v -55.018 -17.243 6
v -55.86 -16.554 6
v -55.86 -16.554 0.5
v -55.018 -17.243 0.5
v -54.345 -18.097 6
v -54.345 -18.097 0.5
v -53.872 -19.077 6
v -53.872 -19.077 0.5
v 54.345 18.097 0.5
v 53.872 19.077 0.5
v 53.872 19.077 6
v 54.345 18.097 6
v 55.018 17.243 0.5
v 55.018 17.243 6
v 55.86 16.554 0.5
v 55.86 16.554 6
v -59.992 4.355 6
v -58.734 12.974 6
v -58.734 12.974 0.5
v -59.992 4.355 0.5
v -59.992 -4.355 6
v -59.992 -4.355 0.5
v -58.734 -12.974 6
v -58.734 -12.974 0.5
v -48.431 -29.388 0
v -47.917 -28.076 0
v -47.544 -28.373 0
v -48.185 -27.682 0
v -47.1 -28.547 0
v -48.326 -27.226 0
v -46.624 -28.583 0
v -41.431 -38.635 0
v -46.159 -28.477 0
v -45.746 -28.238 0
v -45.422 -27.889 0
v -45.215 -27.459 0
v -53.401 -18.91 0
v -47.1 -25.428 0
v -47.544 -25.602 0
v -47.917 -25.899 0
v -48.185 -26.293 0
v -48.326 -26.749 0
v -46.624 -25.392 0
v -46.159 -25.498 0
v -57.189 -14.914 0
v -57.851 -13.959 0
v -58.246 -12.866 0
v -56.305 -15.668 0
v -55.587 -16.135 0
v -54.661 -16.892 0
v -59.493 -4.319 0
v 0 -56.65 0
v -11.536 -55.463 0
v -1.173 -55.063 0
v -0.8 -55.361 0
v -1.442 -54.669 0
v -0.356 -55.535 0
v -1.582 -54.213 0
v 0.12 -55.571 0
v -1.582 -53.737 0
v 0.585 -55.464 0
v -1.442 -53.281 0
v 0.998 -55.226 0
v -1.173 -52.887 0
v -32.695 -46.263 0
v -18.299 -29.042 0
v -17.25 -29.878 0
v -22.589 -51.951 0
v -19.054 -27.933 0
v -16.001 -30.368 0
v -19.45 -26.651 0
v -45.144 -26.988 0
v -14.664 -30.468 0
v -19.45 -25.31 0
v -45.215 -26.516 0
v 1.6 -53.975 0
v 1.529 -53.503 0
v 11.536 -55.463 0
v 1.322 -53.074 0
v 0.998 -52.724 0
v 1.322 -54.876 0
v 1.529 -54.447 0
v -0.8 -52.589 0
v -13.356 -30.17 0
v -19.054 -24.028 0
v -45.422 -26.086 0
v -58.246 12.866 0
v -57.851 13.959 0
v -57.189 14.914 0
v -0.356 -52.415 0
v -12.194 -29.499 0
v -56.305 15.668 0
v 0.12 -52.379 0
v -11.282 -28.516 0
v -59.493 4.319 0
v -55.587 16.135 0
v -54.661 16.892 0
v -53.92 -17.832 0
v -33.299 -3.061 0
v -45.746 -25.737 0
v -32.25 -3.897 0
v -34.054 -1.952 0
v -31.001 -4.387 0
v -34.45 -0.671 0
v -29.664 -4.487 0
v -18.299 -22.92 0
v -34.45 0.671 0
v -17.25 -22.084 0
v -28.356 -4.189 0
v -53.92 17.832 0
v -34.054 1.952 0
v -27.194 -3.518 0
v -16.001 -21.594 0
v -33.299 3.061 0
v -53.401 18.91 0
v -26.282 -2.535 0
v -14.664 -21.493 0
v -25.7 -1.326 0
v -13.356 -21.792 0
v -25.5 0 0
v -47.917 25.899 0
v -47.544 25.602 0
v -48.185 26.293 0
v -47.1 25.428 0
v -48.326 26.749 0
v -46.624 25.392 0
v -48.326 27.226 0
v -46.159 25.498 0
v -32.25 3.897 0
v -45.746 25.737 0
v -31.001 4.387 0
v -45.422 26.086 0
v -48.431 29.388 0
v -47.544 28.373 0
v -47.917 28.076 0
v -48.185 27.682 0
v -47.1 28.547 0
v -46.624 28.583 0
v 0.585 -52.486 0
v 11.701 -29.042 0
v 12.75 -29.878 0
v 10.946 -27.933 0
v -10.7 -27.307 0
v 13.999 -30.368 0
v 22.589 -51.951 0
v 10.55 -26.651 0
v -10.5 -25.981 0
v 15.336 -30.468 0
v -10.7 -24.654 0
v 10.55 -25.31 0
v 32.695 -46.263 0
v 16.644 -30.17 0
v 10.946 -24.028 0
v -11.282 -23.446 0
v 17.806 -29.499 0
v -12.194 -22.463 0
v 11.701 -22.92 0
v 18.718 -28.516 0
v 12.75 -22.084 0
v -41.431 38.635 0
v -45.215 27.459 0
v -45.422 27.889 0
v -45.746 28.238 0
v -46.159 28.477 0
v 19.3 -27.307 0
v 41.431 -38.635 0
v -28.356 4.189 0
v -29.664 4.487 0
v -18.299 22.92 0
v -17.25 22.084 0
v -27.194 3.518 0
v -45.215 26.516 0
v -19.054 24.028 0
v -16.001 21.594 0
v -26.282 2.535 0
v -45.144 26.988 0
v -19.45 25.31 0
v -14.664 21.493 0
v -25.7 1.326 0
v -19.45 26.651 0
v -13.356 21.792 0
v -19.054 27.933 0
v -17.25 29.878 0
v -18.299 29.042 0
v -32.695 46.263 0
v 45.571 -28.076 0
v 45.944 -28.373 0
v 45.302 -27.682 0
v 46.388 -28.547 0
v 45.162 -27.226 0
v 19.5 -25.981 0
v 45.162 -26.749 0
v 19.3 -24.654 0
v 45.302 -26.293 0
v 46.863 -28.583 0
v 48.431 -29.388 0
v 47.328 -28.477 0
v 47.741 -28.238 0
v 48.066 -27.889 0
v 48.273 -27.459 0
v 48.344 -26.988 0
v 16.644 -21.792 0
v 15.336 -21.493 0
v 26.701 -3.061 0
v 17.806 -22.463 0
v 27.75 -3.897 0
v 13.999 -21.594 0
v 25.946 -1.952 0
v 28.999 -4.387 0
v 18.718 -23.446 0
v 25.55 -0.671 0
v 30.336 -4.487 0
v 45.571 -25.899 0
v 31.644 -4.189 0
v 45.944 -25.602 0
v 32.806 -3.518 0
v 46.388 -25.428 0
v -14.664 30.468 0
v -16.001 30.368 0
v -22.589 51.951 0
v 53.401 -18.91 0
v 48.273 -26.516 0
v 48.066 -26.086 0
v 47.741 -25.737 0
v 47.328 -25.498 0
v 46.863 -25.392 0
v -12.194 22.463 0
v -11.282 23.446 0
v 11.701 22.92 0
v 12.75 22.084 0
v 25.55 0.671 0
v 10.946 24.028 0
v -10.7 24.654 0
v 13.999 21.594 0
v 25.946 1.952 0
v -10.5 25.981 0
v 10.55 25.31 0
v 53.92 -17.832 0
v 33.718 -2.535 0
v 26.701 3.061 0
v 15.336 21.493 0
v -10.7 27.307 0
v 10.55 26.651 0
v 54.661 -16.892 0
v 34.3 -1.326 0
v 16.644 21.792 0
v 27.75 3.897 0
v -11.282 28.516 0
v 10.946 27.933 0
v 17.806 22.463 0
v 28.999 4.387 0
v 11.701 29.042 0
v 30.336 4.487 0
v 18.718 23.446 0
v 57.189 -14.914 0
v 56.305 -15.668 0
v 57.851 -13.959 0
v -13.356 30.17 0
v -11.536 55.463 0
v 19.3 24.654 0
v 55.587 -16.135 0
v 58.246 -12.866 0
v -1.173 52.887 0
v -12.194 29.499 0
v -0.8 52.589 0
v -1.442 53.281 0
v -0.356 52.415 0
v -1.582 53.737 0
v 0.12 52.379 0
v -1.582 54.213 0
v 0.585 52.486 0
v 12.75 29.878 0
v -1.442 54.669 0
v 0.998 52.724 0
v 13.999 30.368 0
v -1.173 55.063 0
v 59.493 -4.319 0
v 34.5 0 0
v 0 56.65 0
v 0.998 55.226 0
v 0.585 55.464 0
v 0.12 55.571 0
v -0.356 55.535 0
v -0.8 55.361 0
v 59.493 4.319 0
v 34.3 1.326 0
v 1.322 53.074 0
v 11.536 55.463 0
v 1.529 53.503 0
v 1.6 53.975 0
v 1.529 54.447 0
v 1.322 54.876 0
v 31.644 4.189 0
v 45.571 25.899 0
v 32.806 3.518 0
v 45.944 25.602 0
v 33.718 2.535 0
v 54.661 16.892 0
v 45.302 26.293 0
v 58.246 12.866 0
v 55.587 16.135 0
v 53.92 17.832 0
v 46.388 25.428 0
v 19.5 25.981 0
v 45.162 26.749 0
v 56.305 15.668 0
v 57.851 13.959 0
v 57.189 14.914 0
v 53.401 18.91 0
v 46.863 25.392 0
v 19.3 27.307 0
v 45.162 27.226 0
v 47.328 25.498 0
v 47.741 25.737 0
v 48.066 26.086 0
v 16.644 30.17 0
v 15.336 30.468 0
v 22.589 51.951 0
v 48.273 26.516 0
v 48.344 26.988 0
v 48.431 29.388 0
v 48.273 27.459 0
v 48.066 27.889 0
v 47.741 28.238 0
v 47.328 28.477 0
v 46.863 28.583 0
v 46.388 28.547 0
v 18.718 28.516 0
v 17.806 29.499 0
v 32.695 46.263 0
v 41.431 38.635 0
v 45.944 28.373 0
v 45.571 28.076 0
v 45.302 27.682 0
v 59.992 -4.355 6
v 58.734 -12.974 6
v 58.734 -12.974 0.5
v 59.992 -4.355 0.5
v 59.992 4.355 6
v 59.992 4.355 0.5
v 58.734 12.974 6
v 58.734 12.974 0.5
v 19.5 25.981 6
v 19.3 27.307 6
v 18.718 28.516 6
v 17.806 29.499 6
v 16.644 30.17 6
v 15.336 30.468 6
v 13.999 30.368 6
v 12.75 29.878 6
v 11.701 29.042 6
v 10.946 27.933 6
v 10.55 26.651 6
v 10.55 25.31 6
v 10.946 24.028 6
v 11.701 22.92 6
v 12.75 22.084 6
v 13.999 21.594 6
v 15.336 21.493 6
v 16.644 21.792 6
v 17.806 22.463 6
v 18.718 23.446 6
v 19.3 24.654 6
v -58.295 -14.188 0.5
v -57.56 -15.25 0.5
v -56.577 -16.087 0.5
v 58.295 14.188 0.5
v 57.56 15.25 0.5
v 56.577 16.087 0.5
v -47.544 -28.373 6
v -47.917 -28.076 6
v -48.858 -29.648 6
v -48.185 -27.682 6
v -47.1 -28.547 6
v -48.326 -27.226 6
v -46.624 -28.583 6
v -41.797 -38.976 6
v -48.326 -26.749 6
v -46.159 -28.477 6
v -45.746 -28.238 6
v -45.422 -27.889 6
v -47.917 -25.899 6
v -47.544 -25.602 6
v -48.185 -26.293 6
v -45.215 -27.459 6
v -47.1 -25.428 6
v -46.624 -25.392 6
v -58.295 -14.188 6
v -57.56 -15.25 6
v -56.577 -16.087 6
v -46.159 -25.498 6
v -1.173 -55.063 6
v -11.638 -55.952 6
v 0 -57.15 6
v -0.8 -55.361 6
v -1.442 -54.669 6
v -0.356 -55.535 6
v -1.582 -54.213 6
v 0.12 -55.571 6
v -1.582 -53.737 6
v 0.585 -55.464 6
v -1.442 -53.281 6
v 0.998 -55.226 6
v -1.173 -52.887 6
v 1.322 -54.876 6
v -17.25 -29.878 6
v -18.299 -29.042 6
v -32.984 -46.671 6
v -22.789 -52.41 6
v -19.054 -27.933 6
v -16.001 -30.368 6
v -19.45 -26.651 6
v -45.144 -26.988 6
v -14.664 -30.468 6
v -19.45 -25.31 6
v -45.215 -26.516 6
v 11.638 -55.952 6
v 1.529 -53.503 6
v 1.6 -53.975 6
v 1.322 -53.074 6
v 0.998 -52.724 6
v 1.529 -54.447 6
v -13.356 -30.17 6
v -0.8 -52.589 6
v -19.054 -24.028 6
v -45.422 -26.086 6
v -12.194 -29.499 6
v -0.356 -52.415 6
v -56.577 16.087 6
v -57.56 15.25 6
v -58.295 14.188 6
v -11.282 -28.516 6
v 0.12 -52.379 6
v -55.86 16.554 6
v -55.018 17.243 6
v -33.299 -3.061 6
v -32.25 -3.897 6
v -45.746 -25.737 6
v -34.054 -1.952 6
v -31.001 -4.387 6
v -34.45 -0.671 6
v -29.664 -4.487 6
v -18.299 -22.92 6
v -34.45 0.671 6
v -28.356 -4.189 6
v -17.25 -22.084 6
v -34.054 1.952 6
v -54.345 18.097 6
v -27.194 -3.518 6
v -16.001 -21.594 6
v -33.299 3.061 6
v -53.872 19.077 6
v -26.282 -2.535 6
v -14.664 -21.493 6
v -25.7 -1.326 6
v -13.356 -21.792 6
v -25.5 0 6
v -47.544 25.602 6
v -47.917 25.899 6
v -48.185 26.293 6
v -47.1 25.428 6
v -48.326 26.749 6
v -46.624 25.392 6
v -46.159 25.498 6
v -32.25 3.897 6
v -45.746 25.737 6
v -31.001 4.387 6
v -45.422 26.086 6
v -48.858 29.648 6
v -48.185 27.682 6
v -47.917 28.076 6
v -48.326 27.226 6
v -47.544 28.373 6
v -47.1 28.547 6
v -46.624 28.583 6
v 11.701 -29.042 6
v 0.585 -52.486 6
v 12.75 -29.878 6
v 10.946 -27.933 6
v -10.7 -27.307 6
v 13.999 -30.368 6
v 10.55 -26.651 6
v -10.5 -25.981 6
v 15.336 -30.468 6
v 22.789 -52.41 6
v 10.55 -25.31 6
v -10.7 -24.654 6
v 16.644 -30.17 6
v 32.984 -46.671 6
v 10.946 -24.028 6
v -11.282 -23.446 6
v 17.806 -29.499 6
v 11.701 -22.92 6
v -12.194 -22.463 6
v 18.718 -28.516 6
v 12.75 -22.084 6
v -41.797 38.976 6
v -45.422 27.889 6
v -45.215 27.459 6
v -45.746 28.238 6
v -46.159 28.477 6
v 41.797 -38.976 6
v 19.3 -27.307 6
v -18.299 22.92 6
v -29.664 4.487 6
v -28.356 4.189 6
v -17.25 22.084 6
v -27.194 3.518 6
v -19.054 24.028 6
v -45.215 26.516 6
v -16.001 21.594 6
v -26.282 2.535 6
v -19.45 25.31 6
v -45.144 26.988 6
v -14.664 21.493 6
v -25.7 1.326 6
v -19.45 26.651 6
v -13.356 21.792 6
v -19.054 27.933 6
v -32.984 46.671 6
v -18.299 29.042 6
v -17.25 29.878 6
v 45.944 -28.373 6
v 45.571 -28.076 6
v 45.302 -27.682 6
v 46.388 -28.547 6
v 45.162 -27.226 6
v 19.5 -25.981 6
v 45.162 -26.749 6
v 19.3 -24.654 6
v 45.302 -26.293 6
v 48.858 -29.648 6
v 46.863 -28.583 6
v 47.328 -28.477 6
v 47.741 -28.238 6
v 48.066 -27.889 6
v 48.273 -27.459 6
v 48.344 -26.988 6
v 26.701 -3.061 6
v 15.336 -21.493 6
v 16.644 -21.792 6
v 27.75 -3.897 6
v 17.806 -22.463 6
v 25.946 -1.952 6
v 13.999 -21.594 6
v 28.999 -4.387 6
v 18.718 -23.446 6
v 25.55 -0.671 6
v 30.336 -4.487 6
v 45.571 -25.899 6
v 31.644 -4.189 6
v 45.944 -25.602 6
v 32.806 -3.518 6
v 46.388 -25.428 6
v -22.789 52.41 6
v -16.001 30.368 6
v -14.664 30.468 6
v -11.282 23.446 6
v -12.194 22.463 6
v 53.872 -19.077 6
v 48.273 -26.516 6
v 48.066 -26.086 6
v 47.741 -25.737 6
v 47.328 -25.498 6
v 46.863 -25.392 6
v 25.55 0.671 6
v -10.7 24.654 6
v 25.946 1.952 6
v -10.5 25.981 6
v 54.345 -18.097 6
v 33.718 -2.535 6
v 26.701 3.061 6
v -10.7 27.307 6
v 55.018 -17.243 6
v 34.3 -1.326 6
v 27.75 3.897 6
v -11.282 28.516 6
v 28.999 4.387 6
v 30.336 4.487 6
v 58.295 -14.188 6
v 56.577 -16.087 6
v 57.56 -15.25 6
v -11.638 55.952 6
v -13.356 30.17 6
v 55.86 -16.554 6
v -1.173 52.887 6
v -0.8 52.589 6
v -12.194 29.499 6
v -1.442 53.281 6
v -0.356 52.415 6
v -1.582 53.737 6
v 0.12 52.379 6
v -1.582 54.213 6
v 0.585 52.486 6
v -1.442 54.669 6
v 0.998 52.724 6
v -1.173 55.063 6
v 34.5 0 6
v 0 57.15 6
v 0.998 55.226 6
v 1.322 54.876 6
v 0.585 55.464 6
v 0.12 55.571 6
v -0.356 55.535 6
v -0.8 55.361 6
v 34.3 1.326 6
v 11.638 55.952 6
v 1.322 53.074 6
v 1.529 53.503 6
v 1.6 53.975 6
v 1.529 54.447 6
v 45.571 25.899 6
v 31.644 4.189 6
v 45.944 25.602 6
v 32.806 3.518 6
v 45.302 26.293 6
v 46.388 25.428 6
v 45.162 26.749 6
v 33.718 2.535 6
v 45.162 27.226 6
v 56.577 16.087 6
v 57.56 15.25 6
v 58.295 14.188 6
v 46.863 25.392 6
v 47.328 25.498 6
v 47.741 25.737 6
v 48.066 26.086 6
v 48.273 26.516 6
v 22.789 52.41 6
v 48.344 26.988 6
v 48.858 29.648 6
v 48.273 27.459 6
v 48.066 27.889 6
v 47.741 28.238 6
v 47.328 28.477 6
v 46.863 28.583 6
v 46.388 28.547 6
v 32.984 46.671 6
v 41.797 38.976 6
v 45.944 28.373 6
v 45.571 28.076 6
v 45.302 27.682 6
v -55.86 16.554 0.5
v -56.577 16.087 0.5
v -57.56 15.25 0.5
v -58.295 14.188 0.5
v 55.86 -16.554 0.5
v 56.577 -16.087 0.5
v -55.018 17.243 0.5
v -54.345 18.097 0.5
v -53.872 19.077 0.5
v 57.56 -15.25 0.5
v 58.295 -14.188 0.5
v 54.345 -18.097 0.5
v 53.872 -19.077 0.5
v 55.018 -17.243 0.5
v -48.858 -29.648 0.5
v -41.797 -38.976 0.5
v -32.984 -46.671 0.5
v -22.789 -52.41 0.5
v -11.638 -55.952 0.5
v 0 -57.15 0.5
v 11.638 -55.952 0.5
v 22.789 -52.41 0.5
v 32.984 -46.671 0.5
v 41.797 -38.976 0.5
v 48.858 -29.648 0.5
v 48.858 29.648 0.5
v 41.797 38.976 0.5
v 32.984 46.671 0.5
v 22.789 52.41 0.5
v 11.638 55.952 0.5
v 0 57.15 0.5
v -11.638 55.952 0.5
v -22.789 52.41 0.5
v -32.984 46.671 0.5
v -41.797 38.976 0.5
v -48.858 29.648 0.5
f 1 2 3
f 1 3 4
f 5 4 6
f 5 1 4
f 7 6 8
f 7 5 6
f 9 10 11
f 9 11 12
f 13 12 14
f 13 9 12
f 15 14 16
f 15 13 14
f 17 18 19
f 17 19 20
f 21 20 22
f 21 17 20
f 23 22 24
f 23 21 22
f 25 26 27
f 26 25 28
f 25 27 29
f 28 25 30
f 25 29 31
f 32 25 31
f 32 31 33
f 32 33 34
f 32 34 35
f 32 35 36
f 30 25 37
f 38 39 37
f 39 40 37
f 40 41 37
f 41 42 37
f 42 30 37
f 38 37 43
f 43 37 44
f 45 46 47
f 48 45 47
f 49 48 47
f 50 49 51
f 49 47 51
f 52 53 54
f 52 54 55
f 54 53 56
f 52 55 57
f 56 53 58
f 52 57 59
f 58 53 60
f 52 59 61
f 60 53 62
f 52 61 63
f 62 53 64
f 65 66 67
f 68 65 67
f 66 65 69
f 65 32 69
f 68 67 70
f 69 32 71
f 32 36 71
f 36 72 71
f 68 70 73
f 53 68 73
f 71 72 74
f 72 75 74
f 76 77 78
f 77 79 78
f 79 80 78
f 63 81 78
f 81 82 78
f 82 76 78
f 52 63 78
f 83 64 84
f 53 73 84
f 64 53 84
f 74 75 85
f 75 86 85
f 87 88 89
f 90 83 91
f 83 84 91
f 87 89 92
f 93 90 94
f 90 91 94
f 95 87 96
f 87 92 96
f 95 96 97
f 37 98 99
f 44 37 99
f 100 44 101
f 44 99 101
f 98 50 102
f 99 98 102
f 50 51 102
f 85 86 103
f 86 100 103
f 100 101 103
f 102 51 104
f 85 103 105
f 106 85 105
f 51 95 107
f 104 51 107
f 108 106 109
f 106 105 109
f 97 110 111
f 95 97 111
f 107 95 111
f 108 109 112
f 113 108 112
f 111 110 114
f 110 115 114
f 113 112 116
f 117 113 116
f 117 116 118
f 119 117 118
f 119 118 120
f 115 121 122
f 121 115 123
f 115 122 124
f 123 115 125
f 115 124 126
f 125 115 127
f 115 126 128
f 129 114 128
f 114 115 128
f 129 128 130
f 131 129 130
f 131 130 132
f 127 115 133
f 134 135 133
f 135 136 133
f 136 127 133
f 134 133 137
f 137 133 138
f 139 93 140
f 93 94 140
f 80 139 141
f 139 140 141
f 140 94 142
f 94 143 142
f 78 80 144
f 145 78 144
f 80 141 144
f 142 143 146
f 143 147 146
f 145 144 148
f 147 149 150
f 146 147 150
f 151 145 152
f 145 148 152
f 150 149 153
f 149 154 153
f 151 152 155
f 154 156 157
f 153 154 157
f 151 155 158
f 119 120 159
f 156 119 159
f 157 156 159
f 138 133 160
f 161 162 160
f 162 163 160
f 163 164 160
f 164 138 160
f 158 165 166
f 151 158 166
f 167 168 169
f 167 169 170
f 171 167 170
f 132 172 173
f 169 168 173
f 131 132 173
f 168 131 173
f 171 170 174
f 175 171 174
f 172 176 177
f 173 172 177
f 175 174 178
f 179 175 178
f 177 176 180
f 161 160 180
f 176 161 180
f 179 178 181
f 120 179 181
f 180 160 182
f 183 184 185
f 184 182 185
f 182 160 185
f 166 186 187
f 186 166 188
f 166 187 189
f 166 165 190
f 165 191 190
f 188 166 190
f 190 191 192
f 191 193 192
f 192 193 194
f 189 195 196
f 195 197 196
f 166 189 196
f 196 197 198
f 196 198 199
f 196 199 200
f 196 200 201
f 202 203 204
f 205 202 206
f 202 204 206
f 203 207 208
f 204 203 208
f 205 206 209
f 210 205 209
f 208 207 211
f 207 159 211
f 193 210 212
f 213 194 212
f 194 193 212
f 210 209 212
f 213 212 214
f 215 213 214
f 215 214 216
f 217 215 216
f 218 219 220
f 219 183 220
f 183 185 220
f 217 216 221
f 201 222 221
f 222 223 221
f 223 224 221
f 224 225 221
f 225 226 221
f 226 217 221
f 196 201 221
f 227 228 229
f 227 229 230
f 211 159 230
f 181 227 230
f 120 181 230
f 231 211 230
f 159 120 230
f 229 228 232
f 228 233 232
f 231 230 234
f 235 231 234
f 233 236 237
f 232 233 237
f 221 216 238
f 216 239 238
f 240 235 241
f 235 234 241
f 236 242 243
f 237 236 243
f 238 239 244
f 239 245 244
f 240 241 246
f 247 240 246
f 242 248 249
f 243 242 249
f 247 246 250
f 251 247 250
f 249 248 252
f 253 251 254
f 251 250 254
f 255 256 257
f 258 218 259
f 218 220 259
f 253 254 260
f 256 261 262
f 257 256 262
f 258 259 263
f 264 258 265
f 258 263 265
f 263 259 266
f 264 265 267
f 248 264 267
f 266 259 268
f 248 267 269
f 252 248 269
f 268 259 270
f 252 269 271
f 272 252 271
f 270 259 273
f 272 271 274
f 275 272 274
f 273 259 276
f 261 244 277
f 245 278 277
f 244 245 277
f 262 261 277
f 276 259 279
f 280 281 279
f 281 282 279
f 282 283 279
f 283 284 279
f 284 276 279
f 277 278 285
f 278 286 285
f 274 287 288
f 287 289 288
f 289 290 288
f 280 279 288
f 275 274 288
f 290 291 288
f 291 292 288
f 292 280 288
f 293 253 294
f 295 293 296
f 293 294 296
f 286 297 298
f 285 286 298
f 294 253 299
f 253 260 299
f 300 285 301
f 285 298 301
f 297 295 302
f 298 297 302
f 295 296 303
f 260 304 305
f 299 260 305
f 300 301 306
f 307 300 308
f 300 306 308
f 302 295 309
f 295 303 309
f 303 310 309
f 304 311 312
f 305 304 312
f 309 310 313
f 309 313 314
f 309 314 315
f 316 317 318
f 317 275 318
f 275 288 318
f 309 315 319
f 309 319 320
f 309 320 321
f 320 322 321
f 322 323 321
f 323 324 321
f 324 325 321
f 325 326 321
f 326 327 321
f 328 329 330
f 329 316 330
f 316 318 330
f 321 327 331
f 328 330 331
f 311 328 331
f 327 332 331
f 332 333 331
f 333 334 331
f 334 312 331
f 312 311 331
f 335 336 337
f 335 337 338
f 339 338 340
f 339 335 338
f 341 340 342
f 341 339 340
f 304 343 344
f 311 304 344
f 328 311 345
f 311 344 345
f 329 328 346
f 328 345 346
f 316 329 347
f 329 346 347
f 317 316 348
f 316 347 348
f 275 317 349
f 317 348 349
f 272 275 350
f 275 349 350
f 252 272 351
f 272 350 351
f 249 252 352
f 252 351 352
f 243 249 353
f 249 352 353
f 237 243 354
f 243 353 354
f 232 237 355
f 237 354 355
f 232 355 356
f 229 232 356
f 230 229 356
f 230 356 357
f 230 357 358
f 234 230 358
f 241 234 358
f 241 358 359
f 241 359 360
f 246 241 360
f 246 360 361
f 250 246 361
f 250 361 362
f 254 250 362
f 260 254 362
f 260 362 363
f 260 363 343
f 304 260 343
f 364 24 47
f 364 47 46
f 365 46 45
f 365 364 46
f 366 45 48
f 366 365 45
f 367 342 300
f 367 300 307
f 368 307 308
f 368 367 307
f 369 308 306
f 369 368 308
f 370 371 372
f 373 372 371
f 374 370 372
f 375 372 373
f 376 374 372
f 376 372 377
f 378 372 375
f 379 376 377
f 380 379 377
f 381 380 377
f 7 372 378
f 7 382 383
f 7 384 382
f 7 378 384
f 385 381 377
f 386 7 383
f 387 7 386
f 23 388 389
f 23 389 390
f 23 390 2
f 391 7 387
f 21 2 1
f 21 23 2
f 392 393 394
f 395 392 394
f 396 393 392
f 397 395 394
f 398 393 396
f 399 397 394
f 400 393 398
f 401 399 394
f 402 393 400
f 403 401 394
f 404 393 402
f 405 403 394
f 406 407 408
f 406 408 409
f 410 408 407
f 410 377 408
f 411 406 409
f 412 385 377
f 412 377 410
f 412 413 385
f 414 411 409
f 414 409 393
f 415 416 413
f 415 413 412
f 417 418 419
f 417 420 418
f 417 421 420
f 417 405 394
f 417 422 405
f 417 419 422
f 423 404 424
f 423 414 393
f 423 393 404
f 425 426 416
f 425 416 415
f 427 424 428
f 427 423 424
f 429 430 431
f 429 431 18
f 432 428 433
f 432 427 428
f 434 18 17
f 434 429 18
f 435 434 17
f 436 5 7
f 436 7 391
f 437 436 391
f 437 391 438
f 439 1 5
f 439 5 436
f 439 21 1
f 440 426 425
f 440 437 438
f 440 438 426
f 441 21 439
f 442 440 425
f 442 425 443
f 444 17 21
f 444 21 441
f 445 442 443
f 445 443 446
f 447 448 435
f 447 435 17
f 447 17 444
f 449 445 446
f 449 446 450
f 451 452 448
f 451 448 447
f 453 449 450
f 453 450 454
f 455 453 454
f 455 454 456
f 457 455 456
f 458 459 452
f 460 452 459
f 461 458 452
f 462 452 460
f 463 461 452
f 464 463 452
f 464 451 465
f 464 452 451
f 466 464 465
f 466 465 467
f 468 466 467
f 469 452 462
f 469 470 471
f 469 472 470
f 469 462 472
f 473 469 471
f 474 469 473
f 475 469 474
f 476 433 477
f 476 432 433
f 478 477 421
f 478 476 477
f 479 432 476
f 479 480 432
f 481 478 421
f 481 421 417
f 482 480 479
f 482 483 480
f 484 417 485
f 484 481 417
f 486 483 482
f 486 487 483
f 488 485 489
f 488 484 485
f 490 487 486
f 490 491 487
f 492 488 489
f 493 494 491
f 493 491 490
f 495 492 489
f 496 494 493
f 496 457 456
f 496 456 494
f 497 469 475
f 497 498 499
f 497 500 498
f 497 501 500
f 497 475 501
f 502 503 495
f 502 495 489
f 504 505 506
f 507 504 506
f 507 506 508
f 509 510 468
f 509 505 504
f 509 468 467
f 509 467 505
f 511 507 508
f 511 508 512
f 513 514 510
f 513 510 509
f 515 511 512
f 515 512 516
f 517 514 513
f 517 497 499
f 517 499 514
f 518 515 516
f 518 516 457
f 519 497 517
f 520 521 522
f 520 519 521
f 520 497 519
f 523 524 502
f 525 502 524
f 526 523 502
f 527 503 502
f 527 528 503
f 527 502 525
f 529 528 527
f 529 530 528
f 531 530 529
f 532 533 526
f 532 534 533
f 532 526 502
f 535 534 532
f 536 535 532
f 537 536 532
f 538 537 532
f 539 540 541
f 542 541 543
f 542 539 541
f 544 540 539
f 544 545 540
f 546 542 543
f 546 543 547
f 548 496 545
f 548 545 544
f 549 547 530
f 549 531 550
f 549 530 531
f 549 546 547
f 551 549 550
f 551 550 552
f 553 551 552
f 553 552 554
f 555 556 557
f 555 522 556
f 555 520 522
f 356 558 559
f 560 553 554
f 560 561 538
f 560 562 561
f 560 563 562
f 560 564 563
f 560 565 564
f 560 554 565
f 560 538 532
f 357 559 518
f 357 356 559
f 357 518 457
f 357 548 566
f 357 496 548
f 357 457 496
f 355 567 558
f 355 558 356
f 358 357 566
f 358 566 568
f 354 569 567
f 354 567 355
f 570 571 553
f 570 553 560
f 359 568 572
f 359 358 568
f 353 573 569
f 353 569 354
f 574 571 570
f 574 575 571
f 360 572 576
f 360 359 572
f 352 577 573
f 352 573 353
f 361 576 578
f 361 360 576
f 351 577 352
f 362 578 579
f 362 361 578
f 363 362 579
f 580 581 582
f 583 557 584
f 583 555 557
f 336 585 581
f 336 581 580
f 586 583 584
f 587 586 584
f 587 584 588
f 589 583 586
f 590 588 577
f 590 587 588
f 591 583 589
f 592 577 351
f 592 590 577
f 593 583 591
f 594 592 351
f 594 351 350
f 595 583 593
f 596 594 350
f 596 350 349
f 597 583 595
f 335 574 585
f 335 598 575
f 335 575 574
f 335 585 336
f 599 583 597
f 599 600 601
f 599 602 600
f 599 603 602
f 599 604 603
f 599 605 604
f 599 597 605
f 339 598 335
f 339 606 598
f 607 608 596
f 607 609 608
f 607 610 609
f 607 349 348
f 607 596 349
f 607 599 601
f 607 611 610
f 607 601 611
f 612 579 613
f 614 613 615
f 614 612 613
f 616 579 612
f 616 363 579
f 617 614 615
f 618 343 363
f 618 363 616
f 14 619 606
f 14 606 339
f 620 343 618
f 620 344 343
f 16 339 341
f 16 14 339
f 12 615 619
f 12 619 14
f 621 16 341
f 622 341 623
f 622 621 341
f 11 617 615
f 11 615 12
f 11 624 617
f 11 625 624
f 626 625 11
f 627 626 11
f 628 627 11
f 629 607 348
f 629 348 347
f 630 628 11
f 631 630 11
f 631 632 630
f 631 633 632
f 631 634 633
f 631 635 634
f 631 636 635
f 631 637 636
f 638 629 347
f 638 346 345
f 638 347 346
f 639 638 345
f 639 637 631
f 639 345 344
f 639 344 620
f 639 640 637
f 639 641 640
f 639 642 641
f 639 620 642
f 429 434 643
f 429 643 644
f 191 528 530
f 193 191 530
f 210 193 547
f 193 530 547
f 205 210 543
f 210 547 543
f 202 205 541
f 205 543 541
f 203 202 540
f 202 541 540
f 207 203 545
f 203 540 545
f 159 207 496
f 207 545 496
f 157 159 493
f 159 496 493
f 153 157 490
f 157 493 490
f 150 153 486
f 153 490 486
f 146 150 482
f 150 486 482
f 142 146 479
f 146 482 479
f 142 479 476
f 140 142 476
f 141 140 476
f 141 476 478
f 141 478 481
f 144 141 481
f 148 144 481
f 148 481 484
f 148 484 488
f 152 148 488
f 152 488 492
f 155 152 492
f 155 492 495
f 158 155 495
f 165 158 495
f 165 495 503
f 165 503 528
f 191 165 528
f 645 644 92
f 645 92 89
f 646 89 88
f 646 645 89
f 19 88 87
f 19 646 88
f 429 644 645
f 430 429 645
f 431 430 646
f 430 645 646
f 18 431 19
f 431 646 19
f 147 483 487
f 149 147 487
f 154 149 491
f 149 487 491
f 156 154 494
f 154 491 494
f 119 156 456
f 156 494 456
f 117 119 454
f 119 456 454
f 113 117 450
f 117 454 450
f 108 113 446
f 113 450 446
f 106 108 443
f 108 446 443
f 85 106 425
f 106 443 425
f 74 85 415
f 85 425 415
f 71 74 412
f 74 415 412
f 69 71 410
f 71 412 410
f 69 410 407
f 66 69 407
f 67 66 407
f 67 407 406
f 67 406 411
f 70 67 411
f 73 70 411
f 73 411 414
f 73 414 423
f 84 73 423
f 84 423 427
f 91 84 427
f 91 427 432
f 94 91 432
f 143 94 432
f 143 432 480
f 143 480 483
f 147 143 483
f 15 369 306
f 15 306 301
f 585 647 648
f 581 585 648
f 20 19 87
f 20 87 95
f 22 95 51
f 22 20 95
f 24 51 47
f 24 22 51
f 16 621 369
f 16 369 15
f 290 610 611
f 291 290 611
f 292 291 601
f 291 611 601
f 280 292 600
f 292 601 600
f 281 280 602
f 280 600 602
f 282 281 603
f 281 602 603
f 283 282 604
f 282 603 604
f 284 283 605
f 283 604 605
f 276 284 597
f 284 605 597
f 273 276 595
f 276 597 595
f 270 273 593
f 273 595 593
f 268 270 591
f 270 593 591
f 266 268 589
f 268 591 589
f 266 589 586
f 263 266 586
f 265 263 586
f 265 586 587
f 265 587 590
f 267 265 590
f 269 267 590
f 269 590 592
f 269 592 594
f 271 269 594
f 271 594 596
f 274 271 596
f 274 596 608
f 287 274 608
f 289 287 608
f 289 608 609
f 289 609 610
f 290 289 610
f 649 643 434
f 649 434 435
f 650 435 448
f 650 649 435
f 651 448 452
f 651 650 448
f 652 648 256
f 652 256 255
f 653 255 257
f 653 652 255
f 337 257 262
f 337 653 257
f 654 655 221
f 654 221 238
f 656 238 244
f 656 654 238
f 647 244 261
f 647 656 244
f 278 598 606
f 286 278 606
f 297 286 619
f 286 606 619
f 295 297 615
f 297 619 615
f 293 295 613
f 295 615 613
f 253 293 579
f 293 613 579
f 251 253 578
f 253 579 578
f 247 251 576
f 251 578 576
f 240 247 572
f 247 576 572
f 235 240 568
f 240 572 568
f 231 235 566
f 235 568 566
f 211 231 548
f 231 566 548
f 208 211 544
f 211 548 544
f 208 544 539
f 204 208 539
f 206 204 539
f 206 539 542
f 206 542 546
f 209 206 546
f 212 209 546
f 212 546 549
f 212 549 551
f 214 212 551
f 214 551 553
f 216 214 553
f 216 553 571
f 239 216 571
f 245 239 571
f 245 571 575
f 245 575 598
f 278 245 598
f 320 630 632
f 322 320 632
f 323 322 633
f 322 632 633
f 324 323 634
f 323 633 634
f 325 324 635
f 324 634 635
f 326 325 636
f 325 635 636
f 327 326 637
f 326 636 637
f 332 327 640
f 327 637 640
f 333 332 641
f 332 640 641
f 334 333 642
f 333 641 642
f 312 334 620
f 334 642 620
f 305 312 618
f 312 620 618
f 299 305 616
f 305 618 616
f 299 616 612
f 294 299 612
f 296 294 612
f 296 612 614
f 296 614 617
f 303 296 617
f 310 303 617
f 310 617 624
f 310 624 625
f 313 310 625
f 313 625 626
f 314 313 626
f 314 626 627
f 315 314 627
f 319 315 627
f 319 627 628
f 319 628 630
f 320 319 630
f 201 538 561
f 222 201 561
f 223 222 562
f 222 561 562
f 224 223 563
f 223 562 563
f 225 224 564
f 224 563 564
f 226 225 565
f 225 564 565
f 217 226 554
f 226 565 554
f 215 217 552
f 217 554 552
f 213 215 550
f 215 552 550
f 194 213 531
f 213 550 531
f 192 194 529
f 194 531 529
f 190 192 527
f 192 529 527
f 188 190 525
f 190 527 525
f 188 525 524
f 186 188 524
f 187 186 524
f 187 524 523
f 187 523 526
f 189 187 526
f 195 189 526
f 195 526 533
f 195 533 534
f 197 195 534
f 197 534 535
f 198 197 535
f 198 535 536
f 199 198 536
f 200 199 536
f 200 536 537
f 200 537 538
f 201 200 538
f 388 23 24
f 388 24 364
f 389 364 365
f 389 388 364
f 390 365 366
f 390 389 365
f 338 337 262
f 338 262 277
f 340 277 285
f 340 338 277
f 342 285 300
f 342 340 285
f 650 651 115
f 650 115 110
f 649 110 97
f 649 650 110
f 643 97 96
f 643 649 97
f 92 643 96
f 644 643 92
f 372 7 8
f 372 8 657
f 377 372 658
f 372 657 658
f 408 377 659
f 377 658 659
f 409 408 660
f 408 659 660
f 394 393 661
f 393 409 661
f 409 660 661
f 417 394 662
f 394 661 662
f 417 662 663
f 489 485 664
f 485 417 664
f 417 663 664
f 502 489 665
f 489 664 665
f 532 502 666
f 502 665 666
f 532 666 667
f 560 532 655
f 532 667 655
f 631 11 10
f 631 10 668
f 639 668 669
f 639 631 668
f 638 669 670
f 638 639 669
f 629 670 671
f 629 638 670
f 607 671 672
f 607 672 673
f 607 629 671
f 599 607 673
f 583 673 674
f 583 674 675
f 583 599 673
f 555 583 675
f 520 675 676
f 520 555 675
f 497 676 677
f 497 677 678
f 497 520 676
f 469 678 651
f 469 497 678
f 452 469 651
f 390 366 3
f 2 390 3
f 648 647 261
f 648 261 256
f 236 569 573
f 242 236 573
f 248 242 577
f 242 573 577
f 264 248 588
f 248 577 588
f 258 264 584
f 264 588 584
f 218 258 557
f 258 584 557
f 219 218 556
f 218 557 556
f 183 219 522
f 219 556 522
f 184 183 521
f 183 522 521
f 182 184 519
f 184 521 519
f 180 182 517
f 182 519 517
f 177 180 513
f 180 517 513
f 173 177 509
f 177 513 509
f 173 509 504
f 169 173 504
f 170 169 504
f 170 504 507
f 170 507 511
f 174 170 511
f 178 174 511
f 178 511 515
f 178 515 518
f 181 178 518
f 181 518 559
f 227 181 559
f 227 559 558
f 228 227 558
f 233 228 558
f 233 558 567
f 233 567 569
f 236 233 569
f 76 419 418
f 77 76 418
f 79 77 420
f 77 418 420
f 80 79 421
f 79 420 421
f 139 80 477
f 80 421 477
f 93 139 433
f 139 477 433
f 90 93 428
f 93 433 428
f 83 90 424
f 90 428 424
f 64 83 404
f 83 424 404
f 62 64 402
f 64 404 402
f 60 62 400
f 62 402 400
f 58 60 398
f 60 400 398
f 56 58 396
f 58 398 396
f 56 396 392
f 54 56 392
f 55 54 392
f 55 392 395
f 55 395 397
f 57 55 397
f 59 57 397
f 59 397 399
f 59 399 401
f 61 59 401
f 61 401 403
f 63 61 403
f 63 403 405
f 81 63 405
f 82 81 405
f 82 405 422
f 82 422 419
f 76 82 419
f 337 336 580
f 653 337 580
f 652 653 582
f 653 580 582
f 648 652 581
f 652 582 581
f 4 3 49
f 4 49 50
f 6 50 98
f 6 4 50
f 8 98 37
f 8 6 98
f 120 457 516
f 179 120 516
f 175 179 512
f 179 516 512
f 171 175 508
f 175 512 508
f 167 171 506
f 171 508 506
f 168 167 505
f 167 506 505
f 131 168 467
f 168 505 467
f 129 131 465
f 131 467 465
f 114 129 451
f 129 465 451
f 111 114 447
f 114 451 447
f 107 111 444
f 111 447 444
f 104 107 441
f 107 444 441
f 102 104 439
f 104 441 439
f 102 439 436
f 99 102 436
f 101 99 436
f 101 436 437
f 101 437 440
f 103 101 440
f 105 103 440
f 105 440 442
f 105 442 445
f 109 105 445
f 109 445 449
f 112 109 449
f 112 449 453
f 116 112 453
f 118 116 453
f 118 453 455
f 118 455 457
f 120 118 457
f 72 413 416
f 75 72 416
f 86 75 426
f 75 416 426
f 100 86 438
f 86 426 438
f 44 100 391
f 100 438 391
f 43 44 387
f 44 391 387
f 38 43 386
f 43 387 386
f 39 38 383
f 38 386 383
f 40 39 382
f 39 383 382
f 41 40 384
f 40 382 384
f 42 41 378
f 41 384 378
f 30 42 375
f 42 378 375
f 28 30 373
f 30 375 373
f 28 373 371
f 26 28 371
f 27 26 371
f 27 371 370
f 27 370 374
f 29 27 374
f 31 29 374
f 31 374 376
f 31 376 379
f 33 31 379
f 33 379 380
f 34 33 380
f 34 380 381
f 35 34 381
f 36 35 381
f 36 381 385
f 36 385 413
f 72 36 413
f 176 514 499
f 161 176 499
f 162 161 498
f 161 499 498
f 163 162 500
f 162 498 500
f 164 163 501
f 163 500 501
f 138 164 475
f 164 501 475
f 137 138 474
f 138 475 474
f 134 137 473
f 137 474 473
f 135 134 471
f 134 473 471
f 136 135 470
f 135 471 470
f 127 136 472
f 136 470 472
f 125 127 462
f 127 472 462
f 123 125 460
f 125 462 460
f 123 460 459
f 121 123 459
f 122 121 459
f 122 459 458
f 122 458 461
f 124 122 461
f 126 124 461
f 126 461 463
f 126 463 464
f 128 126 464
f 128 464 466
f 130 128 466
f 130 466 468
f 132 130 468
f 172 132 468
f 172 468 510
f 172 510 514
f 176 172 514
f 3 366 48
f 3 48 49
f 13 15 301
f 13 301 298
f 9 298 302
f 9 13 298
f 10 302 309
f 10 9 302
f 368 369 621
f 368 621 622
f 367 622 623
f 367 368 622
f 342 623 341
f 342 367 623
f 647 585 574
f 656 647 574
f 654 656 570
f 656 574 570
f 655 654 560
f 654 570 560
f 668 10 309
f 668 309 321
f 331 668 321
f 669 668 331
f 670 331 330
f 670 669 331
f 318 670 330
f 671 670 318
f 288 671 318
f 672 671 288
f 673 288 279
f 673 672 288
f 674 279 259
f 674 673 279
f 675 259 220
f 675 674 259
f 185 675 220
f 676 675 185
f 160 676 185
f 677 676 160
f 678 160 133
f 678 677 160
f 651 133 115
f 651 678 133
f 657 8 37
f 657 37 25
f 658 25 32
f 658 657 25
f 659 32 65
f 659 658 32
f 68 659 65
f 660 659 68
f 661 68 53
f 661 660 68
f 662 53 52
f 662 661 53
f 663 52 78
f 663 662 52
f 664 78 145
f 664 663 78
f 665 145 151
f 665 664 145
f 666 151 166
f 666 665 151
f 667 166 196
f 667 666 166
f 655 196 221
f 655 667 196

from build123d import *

# Parameters (mm, degrees)
EXTRUDE_1_DEPTH             = 6
CUT_EXTRUDE_1_DEPTH         = 7
HOLE_WIZARD_9_0_9_1_D       = 9
HOLE_WIZARD_9_0_9_1_DEPTH   = 6
HOLE_WIZARD_3_2_3_2_1_D     = 3.2
HOLE_WIZARD_3_2_3_2_1_DEPTH = 6
FILLET_1_R                  = 5
CHAMFER_1_SIZE              = 0.5


with BuildPart() as part:
    # 草图1 → 凸台-拉伸1 (new body)
    with BuildSketch(Plane.XY.offset(6)):
        with BuildLine():
            Line((-54.404710274, 17.5), (-58.249656651, 15))
            ThreePointArc((-58.249656651, 15), (0, -60.15), (58.249656651, 15))
            Line((58.249656651, 15), (54.404710274, 17.5))
            ThreePointArc((54.404710274, 17.5), (0, 57.15), (-54.404710274, 17.5))
        make_face()
    extrude(amount=-EXTRUDE_1_DEPTH)

    # 草图2 → 切除-拉伸1 (cut, through all)
    with BuildSketch(Plane(origin=(0, 0, 0), x_dir=(-1, 0, 0), z_dir=(0, 0, -1))):
        with BuildLine():
            Line((58.249656651, -15), (54.404710274, -17.5))
            ThreePointArc((54.404710274, -17.5), (0, -57.15), (-54.404710274, -17.5))
            Line((-54.404710274, -17.5), (-58.249656651, -15))
            ThreePointArc((-58.249656651, -15), (0, -60.15), (58.249656651, -15))
        make_face()
    extrude(amount=-CUT_EXTRUDE_1_DEPTH, mode=Mode.SUBTRACT)

    # Ø9.0 (9) 直径孔1
    with Locations(Plane(origin=(0, 0, 0), x_dir=(-1, 0, 0), z_dir=(0, 0, -1))):
        with Locations((-15, 25.980762114), (15, 25.980762114), (30, 0), (15, -25.980762114), (-15, -25.980762114), (-30, 0)):
            Hole(HOLE_WIZARD_9_0_9_1_D / 2, depth=HOLE_WIZARD_9_0_9_1_DEPTH)

    # Ø3.2 (3.2) 直径孔1
    with Locations(Plane(origin=(0, 0, 0), x_dir=(-1, 0, 0), z_dir=(0, 0, -1))):
        with Locations((0, 53.975), (46.743721169, -26.9875), (-46.743721169, 26.9875), (-46.743721169, -26.9875), (0, -53.975), (46.743721169, 26.9875)):
            Hole(HOLE_WIZARD_3_2_3_2_1_D / 2, depth=HOLE_WIZARD_3_2_3_2_1_DEPTH)

    # 圆角1
    fillet_1_edges = [part.edges().sort_by_distance(p)[0] for p in [
        (-58.249656651, -15, 3),
        (58.249656651, -15, 3),
        (54.404710274, -17.5, 3),
        (-54.404710274, -17.5, 3),
        (54.404710274, 17.5, 3),
        (58.249656651, 15, 3),
        (-58.249656651, 15, 3),
        (-54.404710274, 17.5, 3),
    ]]
    fillet(fillet_1_edges, radius=FILLET_1_R)

    # 倒角1
    chamfer_1_edges = [part.edges().sort_by_distance(p)[0] for p in [
        (60.15, 0, 0),
        (56.218559502, 16.320627747, 0),
        (56.218559502, -16.320627747, 0),
        (-60.15, 0, 0),
        (-56.218559502, 16.320627747, 0),
        (0, 57.15, 0),
        (-57.961950962, 14.742761538, 0),
        (57.961950962, -14.742761538, 0),
        (-57.961950962, -14.742761538, 0),
        (57.961950962, 14.742761538, 0),
        (-54.657828511, -17.651398409, 0),
        (54.657828511, -17.651398409, 0),
        (54.657828511, 17.651398409, 0),
        (-54.657828511, 17.651398409, 0),
        (0, -57.15, 0),
        (-56.218559502, -16.320627747, 0),
    ]]
    chamfer(chamfer_1_edges, length=CHAMFER_1_SIZE)


solid = part.part
